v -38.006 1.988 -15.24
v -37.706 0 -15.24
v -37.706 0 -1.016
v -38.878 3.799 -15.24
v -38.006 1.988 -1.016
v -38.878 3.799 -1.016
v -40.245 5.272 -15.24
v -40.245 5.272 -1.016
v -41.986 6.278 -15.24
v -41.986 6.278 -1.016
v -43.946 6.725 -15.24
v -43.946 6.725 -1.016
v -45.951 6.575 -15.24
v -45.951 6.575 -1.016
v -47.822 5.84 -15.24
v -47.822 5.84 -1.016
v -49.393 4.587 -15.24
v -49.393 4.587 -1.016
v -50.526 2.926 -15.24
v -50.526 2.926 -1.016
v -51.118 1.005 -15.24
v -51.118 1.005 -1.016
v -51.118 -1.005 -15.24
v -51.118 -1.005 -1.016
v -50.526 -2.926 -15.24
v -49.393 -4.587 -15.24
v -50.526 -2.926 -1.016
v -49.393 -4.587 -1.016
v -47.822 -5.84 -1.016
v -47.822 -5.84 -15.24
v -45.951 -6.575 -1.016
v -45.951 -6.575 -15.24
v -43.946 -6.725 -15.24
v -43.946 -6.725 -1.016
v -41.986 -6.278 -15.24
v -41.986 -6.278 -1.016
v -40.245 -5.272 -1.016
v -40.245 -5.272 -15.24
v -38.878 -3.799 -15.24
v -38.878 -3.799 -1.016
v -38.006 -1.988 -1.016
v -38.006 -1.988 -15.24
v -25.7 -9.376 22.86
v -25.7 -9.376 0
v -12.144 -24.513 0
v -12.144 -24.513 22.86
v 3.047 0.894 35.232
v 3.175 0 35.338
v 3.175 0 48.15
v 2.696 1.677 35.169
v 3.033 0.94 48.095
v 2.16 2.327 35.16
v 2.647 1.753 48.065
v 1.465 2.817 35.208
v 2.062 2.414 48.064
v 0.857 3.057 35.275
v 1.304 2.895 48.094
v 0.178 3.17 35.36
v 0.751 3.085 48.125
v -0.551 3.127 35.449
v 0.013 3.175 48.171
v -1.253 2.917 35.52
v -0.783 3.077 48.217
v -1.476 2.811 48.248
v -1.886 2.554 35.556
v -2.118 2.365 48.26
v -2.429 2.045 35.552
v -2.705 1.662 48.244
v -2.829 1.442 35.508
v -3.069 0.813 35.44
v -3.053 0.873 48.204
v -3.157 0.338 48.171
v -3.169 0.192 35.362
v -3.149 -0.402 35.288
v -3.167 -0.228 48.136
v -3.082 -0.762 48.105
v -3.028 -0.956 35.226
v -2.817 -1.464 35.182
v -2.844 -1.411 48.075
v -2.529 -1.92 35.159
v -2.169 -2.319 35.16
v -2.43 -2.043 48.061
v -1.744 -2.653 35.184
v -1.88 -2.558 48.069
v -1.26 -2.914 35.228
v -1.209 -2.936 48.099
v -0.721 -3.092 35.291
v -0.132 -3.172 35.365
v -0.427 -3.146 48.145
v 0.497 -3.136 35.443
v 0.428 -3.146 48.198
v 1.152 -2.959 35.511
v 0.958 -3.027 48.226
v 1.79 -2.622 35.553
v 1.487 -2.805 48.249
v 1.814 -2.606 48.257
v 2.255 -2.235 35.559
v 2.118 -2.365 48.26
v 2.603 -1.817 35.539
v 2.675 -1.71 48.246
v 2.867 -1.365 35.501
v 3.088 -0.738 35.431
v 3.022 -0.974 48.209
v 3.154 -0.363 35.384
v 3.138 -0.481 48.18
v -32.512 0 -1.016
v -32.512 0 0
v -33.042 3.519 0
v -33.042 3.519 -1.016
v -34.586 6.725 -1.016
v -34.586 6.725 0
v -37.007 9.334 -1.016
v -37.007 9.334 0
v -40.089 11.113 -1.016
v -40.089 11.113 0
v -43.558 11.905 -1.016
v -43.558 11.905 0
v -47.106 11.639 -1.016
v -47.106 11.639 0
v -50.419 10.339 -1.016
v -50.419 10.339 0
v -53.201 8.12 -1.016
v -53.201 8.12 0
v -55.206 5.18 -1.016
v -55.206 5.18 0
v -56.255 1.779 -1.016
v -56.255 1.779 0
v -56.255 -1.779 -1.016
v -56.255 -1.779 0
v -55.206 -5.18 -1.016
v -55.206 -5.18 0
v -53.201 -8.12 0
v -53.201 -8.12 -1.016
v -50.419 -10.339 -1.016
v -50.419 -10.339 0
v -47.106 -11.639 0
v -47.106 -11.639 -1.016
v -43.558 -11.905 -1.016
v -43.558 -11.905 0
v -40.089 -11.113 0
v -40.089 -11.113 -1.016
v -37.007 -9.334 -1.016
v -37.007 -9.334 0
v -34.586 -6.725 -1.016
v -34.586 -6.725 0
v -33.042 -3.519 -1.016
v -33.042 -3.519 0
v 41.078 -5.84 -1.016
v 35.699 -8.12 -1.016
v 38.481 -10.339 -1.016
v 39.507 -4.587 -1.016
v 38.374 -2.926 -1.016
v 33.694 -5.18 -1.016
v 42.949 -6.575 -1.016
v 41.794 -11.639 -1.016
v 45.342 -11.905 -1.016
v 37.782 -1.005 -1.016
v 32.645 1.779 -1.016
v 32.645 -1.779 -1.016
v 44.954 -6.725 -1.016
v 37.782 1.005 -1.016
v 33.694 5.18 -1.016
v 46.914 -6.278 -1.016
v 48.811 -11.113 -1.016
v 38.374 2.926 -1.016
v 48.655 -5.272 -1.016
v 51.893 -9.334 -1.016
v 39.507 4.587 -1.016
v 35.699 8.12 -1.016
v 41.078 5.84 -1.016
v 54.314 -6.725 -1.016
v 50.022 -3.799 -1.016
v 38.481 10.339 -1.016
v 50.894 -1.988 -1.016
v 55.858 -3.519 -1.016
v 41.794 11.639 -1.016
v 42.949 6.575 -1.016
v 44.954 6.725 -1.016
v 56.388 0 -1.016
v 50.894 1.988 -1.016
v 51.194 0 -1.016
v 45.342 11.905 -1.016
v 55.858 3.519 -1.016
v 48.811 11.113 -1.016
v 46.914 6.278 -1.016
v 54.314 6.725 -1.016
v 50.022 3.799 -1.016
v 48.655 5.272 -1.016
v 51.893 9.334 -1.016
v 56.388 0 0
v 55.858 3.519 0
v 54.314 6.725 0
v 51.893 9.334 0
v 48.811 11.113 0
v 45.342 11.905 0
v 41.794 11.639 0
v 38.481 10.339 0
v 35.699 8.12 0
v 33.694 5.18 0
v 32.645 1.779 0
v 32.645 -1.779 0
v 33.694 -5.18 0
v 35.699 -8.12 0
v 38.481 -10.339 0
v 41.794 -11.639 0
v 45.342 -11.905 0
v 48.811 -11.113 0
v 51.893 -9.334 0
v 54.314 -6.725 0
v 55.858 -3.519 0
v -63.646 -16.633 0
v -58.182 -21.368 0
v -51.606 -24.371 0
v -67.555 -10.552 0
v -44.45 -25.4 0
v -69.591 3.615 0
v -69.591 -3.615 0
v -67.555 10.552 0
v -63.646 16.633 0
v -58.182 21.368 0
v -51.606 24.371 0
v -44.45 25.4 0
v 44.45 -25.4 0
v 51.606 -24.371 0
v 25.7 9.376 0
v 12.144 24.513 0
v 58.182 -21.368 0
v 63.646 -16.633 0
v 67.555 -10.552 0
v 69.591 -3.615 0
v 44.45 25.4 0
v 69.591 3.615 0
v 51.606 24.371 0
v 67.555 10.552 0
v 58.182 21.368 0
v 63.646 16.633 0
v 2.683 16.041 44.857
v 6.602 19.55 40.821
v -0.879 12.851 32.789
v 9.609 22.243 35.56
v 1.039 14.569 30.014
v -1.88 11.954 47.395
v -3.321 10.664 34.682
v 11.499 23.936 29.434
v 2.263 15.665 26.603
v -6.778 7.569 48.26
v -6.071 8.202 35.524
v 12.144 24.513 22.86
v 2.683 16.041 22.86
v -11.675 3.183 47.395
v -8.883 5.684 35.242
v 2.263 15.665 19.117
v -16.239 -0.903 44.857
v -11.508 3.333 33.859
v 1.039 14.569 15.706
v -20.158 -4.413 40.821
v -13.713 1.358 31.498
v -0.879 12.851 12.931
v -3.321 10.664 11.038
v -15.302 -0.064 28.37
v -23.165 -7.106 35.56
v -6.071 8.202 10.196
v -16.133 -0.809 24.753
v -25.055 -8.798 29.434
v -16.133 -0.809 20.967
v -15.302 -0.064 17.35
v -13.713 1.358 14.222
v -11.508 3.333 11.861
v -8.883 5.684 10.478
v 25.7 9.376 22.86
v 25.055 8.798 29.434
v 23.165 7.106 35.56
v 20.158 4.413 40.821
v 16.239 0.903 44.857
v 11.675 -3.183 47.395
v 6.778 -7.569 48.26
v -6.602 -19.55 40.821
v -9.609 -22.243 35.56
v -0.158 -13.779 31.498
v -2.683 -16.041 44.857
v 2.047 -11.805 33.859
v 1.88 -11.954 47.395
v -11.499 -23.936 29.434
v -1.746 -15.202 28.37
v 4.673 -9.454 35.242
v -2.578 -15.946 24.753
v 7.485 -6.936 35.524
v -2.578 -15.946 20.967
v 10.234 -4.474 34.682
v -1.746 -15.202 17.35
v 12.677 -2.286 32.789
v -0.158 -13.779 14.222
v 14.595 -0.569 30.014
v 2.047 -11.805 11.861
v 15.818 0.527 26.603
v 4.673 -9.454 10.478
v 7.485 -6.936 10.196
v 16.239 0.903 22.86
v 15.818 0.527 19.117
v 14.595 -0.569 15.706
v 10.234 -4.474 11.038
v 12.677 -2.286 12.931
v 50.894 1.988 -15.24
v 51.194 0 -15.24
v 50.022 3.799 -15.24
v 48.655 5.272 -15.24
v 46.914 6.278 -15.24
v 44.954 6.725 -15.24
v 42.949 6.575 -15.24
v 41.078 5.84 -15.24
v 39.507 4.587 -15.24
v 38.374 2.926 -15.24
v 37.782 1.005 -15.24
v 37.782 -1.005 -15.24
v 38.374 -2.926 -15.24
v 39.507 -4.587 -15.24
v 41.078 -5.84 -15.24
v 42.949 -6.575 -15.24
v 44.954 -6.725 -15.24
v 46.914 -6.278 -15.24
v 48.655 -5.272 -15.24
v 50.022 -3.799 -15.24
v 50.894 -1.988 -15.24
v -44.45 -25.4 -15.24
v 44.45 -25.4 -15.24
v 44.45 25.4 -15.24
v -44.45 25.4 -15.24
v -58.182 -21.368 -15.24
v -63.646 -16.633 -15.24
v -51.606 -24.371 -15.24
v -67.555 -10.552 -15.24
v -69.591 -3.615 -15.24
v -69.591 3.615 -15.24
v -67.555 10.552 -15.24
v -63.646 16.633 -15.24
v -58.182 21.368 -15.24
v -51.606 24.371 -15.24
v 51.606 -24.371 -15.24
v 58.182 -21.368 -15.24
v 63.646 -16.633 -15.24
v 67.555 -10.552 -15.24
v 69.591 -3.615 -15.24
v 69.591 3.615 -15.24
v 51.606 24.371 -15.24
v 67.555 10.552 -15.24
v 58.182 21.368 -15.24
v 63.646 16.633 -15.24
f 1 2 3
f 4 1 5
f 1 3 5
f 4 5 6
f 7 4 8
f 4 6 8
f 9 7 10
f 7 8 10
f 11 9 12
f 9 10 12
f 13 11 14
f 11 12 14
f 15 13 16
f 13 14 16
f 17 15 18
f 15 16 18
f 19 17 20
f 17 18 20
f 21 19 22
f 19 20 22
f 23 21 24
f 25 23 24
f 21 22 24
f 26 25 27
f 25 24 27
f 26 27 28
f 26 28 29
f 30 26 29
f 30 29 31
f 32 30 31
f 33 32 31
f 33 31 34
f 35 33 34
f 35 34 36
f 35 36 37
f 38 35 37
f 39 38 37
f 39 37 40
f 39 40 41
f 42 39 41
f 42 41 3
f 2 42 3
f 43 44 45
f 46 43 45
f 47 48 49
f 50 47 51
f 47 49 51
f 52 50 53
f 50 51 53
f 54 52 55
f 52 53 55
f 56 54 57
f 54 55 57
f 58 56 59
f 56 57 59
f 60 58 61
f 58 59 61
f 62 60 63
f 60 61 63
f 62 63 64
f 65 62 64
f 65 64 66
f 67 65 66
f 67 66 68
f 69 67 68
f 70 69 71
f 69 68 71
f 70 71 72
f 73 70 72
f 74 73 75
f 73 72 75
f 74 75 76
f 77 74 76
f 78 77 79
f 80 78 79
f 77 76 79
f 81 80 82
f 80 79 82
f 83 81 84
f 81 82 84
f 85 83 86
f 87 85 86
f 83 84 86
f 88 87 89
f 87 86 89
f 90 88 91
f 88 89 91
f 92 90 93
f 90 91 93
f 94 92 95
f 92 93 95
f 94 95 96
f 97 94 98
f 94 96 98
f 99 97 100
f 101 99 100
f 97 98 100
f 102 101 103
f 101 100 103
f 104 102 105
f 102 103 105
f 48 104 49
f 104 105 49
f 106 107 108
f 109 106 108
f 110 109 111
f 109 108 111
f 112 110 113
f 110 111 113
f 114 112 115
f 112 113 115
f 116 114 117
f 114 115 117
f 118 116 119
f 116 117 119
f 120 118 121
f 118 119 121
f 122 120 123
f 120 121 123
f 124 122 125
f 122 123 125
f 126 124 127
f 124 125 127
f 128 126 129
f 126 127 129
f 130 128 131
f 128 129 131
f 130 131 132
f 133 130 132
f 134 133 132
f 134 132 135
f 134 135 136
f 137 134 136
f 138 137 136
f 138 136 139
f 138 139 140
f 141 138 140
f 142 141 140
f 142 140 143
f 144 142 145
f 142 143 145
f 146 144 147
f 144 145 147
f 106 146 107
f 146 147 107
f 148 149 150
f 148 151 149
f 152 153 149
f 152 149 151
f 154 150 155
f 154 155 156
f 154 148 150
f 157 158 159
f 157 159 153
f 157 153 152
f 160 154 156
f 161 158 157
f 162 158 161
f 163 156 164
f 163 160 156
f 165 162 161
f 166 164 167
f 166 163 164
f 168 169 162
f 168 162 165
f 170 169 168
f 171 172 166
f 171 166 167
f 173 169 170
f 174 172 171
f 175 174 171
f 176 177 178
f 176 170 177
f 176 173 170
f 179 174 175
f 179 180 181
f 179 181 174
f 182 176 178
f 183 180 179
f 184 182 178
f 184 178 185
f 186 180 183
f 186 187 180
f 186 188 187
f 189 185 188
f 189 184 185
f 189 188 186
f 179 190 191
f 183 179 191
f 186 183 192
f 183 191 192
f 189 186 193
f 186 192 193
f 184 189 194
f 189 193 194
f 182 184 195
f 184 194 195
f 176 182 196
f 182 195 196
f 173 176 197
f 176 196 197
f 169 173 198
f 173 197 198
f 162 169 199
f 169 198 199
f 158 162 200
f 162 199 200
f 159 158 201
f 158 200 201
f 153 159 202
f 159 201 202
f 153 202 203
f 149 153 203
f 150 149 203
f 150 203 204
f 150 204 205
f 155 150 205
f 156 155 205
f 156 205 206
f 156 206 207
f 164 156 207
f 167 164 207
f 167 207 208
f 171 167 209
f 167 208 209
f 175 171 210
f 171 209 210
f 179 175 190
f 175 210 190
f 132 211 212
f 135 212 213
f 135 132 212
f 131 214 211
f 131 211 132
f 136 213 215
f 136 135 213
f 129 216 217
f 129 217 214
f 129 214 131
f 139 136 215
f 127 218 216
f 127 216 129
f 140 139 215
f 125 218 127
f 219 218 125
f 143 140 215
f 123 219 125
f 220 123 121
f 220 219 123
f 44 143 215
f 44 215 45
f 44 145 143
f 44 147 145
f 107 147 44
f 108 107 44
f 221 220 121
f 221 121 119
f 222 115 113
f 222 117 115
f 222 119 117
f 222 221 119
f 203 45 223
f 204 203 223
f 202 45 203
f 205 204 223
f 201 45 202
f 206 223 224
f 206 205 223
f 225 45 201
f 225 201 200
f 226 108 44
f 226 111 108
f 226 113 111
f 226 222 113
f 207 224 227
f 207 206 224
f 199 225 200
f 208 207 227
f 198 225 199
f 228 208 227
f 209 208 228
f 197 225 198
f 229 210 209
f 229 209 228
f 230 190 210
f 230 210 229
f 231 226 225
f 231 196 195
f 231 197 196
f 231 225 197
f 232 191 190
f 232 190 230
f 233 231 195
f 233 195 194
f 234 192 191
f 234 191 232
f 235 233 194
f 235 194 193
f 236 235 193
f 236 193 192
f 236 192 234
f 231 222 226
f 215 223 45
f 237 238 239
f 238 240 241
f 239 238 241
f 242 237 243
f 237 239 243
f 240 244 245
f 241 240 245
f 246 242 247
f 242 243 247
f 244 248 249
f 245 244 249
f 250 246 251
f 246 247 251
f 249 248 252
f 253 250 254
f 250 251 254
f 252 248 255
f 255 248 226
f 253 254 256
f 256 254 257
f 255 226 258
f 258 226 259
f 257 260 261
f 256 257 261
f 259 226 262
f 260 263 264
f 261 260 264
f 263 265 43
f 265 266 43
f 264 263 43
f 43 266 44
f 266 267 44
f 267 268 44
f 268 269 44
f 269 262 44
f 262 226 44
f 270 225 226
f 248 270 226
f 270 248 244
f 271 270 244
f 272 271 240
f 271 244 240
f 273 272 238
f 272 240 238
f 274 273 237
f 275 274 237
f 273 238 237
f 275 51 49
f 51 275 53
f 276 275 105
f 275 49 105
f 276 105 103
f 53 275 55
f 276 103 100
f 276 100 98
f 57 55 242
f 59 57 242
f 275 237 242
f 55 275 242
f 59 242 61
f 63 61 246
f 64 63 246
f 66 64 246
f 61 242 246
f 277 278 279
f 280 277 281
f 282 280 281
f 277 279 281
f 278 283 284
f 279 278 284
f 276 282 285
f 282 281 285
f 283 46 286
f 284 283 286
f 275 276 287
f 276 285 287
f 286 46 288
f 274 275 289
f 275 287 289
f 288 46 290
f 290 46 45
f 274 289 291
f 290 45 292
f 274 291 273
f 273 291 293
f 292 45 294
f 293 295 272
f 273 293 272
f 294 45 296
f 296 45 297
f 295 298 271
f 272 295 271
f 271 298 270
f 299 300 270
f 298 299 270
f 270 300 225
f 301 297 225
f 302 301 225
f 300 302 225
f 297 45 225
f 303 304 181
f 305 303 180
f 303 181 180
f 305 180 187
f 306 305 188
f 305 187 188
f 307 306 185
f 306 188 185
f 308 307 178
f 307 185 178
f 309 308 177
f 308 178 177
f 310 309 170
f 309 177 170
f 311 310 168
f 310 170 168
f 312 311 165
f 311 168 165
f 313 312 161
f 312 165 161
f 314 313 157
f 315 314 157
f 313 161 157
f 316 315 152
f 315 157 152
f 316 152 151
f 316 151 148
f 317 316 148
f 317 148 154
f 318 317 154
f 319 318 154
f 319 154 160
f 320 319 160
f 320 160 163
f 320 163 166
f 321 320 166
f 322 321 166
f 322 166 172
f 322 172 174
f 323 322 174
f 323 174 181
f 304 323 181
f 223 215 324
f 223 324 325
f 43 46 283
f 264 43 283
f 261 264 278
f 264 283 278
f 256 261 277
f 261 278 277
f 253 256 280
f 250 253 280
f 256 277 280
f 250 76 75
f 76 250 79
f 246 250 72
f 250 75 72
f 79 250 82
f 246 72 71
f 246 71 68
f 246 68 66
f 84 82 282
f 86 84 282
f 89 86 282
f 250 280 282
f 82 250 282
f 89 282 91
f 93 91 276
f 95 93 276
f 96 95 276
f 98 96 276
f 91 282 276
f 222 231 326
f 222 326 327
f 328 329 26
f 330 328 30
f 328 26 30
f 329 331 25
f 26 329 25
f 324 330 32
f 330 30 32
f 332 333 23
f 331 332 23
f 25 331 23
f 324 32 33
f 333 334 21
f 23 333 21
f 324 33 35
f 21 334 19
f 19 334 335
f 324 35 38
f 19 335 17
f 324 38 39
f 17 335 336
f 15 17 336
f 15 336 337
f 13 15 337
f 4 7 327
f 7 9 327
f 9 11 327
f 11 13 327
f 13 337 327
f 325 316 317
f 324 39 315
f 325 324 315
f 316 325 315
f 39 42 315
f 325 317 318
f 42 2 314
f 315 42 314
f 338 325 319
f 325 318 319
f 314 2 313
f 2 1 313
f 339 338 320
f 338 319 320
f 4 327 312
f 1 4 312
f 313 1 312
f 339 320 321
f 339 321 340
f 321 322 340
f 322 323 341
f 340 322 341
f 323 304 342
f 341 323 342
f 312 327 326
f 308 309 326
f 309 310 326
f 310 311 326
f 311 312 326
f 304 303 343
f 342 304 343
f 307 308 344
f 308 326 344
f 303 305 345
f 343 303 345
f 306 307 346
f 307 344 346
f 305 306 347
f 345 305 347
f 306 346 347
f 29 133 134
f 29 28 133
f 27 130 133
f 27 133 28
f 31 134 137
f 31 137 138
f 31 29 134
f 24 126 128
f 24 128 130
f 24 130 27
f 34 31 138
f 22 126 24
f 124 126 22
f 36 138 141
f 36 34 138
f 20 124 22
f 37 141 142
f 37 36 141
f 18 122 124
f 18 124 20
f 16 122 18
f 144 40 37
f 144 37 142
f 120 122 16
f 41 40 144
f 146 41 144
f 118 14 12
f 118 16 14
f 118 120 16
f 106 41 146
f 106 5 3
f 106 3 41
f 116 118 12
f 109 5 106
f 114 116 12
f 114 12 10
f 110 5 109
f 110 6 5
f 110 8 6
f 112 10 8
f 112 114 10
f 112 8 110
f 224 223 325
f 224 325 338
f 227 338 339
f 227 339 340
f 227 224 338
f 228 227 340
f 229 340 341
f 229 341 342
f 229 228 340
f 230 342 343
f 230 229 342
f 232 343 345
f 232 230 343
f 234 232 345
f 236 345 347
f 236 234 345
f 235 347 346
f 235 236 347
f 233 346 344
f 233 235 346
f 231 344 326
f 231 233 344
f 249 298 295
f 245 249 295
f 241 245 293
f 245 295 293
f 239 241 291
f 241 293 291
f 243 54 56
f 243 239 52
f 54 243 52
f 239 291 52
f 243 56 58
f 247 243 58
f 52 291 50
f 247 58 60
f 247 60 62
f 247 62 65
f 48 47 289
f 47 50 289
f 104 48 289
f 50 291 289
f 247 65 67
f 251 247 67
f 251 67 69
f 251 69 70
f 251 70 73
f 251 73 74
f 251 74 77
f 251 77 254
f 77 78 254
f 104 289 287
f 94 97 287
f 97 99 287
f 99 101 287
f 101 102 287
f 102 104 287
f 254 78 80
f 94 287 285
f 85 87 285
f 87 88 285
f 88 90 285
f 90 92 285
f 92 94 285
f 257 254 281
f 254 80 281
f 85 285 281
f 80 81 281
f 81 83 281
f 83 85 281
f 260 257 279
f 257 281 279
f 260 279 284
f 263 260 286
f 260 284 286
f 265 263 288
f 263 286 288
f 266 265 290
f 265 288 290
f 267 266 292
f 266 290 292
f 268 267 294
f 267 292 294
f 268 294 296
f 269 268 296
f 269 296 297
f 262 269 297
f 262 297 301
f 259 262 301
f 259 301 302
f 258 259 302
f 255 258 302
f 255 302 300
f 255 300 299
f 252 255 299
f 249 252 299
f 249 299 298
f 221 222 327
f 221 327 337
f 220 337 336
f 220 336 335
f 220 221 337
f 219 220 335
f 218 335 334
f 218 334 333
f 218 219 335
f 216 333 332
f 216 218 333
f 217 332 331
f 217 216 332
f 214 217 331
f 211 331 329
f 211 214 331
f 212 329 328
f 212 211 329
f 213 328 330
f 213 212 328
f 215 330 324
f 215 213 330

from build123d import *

# Parameters (mm, degrees)
F0_R     = 11.938
F0_R_2   = 6.7437
F1_DEPTH = 15.24
F2_DEPTH = 1.016
F4_DEPTH = 48.26
F5_R     = 25.39999
F6_R     = 12.7
F7_DEPTH = 25.4
F8_R     = 3.175
F9_DEPTH = 13.1042779754


# Not quite as in the source:
# - a fillet or chamfer is up to 0.001 mm smaller than in the source, because OpenCascade refuses the exact size
# - a feature names something its author has since deleted; it is built from what else it names


with BuildPart() as f1:
    # F0 (on Top) → F1 (new body)
    with BuildSketch(Plane.XY):
        with BuildLine():
            Line((44.45, 25.4), (-44.45, 25.4))
            ThreePointArc((-44.45, 25.4), (-69.85, 0), (-44.45, -25.4))
            Line((-44.45, -25.4), (44.45, -25.4))
            ThreePointArc((44.45, -25.4), (69.85, 0), (44.45, 25.4))
        make_face()
        with Locations((-44.45, 0)):
            Circle(F0_R, mode=Mode.SUBTRACT)
        Polygon((-12.1442471439, -24.5133200793), (-25.6998479864, -9.3756820272), (12.1442471439, 24.5133200793), (25.6998479864, 9.3756820272), align=None, mode=Mode.SUBTRACT)
        with Locations((44.45, 0)):
            Circle(F0_R, mode=Mode.SUBTRACT)
        with Locations((-44.45, 0)):
            Circle(F0_R)
        with Locations((-44.45, 0)):
            Circle(F0_R_2, mode=Mode.SUBTRACT)
        with Locations((44.45, 0)):
            Circle(F0_R)
        with Locations((44.45, 0)):
            Circle(F0_R_2, mode=Mode.SUBTRACT)
        Polygon((12.1442471439, 24.5133200793), (-25.6998479864, -9.3756820272), (-12.1442471439, -24.5133200793), (25.6998479864, 9.3756820272), align=None)
    extrude(amount=-F1_DEPTH)

    # F0 (on Top) → F2 (cut)
    with BuildSketch(Plane.XY):
        with Locations((-44.45, 0)):
            Circle(F0_R)
        with Locations((-44.45, 0)):
            Circle(F0_R_2, mode=Mode.SUBTRACT)
        with Locations((44.45, 0)):
            Circle(F0_R)
        with Locations((44.45, 0)):
            Circle(F0_R_2, mode=Mode.SUBTRACT)
    extrude(amount=-F2_DEPTH, mode=Mode.SUBTRACT)

    # F0 (on Top) → F4 (join)
    with BuildSketch(Plane.XY):
        Polygon((12.1442471439, 24.5133200793), (-25.6998479864, -9.3756820272), (-12.1442471439, -24.5133200793), (25.6998479864, 9.3756820272), align=None)
    extrude(amount=F4_DEPTH)

    # F5 (radius 25.4 in the source; OpenCascade refuses exactly that, so slightly less here)
    f5_edges = [f1.edges().sort_by_distance(p)[0] for p in [
        (-18.922048, -16.944501, 48.26),
        (18.922048, 16.944501, 48.26),
    ]]
    fillet(f5_edges, radius=F5_R)

    # F6 (on face) → F7 (cut)
    with BuildSketch(Plane(origin=(6.7778004213, -7.5688190261, 0), x_dir=(0.7449625026, 0.6671063407, 0), z_dir=(0.6671063407, -0.7449625026, 0))):
        with Locations((0, 22.86)):
            Circle(F6_R)
    extrude(amount=-F7_DEPTH, mode=Mode.SUBTRACT)

    # F8 (on offset) → F9 (cut, through all)
    with BuildSketch(Plane.XY.offset(48.26)):
        Circle(F8_R)
    extrude(amount=-F9_DEPTH, mode=Mode.SUBTRACT)


solid = f1.part
